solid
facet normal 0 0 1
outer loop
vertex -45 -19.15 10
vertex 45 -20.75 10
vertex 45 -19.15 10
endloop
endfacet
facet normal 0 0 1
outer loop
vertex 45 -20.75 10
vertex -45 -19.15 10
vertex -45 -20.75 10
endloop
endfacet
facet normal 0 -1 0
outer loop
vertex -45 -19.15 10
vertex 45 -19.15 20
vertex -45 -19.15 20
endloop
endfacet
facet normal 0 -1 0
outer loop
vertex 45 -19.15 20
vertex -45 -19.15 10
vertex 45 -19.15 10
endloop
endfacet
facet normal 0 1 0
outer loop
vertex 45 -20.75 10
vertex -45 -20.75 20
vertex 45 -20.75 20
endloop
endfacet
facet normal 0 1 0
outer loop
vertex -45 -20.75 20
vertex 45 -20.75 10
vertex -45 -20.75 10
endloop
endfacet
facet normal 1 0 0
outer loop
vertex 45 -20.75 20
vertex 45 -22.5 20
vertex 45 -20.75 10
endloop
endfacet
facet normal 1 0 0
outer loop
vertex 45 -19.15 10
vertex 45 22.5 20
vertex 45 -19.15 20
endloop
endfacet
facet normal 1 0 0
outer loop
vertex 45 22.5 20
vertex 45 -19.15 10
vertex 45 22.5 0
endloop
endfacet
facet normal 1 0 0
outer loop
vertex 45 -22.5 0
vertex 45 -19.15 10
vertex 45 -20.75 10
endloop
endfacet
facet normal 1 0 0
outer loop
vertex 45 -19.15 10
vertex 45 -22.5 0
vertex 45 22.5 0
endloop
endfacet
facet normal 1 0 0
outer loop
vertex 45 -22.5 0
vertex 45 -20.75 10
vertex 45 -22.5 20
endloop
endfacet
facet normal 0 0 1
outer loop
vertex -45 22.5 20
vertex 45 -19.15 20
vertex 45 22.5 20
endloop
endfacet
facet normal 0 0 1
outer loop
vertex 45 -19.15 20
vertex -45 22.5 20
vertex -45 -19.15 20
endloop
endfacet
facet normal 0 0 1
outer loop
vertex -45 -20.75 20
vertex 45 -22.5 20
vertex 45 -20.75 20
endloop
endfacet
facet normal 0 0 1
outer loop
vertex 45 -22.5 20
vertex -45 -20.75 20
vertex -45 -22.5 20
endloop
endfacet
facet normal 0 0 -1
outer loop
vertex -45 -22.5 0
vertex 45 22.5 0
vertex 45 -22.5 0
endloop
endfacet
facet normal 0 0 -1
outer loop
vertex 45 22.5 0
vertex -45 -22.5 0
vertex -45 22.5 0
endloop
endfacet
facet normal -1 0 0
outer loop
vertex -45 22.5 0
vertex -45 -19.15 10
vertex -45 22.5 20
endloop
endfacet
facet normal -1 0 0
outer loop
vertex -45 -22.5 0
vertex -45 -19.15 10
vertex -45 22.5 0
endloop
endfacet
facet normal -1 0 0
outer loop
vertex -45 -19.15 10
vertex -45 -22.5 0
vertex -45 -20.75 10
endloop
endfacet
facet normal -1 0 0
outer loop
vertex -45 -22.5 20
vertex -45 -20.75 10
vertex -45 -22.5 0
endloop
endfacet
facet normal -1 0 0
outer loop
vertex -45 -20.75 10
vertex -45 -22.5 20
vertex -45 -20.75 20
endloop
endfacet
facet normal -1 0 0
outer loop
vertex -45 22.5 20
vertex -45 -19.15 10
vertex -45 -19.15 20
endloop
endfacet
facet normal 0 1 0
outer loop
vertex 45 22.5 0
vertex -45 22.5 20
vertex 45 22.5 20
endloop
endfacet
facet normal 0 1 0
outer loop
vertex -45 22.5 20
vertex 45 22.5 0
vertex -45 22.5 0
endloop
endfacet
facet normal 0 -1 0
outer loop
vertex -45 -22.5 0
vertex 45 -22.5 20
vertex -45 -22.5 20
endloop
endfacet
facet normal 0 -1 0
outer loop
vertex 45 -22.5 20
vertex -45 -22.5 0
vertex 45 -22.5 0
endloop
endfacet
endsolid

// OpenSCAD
// Slide drying rack for microscope slides (75 x 25 x 1 mm)
// Print orientation: base on XY plane, slots open upward (+Z)

// ---- Block dimensions ----
block_len   = 90;    // block length along X (mm)
block_wid   = 45;    // block width along Y (mm)
block_ht    = 20;    // block height along Z (mm)

// ---- Slot dimensions ----
slot_count  = 10;    // number of slide slots
slot_len    = 77;    // slot length along X (mm)
slot_wid    = 1.6;   // slot width along Y (mm)
slot_depth  = 10;    // slot depth from top face (mm)
slot_pitch  = 3.5;   // centre-to-centre spacing in Y (mm)

// ---- Misc ----
eps         = 0.5;   // overshoot for clean cuts (mm)
$fn         = 64;    // circle resolution

// X offset of the first slot so the row is centred on the block
first_slot_x = -(slot_count - 1) * slot_pitch / 2;

difference() {
    // Base block, centred in X/Y, resting on z = 0
    translate([-block_len / 2, -block_wid / 2, 0])
        cube([block_len, block_wid, block_ht]);

    // Slots, open at the top
    for (i = [0 : slot_count - 1]) {
        translate([first_slot_x + i * slot_pitch - slot_len / 2,
                   -block_wid / 2 + slot_pitch / 2,
                   block_ht - slot_depth])
            cube([slot_len, slot_wid, slot_depth + eps]);
    }
}
